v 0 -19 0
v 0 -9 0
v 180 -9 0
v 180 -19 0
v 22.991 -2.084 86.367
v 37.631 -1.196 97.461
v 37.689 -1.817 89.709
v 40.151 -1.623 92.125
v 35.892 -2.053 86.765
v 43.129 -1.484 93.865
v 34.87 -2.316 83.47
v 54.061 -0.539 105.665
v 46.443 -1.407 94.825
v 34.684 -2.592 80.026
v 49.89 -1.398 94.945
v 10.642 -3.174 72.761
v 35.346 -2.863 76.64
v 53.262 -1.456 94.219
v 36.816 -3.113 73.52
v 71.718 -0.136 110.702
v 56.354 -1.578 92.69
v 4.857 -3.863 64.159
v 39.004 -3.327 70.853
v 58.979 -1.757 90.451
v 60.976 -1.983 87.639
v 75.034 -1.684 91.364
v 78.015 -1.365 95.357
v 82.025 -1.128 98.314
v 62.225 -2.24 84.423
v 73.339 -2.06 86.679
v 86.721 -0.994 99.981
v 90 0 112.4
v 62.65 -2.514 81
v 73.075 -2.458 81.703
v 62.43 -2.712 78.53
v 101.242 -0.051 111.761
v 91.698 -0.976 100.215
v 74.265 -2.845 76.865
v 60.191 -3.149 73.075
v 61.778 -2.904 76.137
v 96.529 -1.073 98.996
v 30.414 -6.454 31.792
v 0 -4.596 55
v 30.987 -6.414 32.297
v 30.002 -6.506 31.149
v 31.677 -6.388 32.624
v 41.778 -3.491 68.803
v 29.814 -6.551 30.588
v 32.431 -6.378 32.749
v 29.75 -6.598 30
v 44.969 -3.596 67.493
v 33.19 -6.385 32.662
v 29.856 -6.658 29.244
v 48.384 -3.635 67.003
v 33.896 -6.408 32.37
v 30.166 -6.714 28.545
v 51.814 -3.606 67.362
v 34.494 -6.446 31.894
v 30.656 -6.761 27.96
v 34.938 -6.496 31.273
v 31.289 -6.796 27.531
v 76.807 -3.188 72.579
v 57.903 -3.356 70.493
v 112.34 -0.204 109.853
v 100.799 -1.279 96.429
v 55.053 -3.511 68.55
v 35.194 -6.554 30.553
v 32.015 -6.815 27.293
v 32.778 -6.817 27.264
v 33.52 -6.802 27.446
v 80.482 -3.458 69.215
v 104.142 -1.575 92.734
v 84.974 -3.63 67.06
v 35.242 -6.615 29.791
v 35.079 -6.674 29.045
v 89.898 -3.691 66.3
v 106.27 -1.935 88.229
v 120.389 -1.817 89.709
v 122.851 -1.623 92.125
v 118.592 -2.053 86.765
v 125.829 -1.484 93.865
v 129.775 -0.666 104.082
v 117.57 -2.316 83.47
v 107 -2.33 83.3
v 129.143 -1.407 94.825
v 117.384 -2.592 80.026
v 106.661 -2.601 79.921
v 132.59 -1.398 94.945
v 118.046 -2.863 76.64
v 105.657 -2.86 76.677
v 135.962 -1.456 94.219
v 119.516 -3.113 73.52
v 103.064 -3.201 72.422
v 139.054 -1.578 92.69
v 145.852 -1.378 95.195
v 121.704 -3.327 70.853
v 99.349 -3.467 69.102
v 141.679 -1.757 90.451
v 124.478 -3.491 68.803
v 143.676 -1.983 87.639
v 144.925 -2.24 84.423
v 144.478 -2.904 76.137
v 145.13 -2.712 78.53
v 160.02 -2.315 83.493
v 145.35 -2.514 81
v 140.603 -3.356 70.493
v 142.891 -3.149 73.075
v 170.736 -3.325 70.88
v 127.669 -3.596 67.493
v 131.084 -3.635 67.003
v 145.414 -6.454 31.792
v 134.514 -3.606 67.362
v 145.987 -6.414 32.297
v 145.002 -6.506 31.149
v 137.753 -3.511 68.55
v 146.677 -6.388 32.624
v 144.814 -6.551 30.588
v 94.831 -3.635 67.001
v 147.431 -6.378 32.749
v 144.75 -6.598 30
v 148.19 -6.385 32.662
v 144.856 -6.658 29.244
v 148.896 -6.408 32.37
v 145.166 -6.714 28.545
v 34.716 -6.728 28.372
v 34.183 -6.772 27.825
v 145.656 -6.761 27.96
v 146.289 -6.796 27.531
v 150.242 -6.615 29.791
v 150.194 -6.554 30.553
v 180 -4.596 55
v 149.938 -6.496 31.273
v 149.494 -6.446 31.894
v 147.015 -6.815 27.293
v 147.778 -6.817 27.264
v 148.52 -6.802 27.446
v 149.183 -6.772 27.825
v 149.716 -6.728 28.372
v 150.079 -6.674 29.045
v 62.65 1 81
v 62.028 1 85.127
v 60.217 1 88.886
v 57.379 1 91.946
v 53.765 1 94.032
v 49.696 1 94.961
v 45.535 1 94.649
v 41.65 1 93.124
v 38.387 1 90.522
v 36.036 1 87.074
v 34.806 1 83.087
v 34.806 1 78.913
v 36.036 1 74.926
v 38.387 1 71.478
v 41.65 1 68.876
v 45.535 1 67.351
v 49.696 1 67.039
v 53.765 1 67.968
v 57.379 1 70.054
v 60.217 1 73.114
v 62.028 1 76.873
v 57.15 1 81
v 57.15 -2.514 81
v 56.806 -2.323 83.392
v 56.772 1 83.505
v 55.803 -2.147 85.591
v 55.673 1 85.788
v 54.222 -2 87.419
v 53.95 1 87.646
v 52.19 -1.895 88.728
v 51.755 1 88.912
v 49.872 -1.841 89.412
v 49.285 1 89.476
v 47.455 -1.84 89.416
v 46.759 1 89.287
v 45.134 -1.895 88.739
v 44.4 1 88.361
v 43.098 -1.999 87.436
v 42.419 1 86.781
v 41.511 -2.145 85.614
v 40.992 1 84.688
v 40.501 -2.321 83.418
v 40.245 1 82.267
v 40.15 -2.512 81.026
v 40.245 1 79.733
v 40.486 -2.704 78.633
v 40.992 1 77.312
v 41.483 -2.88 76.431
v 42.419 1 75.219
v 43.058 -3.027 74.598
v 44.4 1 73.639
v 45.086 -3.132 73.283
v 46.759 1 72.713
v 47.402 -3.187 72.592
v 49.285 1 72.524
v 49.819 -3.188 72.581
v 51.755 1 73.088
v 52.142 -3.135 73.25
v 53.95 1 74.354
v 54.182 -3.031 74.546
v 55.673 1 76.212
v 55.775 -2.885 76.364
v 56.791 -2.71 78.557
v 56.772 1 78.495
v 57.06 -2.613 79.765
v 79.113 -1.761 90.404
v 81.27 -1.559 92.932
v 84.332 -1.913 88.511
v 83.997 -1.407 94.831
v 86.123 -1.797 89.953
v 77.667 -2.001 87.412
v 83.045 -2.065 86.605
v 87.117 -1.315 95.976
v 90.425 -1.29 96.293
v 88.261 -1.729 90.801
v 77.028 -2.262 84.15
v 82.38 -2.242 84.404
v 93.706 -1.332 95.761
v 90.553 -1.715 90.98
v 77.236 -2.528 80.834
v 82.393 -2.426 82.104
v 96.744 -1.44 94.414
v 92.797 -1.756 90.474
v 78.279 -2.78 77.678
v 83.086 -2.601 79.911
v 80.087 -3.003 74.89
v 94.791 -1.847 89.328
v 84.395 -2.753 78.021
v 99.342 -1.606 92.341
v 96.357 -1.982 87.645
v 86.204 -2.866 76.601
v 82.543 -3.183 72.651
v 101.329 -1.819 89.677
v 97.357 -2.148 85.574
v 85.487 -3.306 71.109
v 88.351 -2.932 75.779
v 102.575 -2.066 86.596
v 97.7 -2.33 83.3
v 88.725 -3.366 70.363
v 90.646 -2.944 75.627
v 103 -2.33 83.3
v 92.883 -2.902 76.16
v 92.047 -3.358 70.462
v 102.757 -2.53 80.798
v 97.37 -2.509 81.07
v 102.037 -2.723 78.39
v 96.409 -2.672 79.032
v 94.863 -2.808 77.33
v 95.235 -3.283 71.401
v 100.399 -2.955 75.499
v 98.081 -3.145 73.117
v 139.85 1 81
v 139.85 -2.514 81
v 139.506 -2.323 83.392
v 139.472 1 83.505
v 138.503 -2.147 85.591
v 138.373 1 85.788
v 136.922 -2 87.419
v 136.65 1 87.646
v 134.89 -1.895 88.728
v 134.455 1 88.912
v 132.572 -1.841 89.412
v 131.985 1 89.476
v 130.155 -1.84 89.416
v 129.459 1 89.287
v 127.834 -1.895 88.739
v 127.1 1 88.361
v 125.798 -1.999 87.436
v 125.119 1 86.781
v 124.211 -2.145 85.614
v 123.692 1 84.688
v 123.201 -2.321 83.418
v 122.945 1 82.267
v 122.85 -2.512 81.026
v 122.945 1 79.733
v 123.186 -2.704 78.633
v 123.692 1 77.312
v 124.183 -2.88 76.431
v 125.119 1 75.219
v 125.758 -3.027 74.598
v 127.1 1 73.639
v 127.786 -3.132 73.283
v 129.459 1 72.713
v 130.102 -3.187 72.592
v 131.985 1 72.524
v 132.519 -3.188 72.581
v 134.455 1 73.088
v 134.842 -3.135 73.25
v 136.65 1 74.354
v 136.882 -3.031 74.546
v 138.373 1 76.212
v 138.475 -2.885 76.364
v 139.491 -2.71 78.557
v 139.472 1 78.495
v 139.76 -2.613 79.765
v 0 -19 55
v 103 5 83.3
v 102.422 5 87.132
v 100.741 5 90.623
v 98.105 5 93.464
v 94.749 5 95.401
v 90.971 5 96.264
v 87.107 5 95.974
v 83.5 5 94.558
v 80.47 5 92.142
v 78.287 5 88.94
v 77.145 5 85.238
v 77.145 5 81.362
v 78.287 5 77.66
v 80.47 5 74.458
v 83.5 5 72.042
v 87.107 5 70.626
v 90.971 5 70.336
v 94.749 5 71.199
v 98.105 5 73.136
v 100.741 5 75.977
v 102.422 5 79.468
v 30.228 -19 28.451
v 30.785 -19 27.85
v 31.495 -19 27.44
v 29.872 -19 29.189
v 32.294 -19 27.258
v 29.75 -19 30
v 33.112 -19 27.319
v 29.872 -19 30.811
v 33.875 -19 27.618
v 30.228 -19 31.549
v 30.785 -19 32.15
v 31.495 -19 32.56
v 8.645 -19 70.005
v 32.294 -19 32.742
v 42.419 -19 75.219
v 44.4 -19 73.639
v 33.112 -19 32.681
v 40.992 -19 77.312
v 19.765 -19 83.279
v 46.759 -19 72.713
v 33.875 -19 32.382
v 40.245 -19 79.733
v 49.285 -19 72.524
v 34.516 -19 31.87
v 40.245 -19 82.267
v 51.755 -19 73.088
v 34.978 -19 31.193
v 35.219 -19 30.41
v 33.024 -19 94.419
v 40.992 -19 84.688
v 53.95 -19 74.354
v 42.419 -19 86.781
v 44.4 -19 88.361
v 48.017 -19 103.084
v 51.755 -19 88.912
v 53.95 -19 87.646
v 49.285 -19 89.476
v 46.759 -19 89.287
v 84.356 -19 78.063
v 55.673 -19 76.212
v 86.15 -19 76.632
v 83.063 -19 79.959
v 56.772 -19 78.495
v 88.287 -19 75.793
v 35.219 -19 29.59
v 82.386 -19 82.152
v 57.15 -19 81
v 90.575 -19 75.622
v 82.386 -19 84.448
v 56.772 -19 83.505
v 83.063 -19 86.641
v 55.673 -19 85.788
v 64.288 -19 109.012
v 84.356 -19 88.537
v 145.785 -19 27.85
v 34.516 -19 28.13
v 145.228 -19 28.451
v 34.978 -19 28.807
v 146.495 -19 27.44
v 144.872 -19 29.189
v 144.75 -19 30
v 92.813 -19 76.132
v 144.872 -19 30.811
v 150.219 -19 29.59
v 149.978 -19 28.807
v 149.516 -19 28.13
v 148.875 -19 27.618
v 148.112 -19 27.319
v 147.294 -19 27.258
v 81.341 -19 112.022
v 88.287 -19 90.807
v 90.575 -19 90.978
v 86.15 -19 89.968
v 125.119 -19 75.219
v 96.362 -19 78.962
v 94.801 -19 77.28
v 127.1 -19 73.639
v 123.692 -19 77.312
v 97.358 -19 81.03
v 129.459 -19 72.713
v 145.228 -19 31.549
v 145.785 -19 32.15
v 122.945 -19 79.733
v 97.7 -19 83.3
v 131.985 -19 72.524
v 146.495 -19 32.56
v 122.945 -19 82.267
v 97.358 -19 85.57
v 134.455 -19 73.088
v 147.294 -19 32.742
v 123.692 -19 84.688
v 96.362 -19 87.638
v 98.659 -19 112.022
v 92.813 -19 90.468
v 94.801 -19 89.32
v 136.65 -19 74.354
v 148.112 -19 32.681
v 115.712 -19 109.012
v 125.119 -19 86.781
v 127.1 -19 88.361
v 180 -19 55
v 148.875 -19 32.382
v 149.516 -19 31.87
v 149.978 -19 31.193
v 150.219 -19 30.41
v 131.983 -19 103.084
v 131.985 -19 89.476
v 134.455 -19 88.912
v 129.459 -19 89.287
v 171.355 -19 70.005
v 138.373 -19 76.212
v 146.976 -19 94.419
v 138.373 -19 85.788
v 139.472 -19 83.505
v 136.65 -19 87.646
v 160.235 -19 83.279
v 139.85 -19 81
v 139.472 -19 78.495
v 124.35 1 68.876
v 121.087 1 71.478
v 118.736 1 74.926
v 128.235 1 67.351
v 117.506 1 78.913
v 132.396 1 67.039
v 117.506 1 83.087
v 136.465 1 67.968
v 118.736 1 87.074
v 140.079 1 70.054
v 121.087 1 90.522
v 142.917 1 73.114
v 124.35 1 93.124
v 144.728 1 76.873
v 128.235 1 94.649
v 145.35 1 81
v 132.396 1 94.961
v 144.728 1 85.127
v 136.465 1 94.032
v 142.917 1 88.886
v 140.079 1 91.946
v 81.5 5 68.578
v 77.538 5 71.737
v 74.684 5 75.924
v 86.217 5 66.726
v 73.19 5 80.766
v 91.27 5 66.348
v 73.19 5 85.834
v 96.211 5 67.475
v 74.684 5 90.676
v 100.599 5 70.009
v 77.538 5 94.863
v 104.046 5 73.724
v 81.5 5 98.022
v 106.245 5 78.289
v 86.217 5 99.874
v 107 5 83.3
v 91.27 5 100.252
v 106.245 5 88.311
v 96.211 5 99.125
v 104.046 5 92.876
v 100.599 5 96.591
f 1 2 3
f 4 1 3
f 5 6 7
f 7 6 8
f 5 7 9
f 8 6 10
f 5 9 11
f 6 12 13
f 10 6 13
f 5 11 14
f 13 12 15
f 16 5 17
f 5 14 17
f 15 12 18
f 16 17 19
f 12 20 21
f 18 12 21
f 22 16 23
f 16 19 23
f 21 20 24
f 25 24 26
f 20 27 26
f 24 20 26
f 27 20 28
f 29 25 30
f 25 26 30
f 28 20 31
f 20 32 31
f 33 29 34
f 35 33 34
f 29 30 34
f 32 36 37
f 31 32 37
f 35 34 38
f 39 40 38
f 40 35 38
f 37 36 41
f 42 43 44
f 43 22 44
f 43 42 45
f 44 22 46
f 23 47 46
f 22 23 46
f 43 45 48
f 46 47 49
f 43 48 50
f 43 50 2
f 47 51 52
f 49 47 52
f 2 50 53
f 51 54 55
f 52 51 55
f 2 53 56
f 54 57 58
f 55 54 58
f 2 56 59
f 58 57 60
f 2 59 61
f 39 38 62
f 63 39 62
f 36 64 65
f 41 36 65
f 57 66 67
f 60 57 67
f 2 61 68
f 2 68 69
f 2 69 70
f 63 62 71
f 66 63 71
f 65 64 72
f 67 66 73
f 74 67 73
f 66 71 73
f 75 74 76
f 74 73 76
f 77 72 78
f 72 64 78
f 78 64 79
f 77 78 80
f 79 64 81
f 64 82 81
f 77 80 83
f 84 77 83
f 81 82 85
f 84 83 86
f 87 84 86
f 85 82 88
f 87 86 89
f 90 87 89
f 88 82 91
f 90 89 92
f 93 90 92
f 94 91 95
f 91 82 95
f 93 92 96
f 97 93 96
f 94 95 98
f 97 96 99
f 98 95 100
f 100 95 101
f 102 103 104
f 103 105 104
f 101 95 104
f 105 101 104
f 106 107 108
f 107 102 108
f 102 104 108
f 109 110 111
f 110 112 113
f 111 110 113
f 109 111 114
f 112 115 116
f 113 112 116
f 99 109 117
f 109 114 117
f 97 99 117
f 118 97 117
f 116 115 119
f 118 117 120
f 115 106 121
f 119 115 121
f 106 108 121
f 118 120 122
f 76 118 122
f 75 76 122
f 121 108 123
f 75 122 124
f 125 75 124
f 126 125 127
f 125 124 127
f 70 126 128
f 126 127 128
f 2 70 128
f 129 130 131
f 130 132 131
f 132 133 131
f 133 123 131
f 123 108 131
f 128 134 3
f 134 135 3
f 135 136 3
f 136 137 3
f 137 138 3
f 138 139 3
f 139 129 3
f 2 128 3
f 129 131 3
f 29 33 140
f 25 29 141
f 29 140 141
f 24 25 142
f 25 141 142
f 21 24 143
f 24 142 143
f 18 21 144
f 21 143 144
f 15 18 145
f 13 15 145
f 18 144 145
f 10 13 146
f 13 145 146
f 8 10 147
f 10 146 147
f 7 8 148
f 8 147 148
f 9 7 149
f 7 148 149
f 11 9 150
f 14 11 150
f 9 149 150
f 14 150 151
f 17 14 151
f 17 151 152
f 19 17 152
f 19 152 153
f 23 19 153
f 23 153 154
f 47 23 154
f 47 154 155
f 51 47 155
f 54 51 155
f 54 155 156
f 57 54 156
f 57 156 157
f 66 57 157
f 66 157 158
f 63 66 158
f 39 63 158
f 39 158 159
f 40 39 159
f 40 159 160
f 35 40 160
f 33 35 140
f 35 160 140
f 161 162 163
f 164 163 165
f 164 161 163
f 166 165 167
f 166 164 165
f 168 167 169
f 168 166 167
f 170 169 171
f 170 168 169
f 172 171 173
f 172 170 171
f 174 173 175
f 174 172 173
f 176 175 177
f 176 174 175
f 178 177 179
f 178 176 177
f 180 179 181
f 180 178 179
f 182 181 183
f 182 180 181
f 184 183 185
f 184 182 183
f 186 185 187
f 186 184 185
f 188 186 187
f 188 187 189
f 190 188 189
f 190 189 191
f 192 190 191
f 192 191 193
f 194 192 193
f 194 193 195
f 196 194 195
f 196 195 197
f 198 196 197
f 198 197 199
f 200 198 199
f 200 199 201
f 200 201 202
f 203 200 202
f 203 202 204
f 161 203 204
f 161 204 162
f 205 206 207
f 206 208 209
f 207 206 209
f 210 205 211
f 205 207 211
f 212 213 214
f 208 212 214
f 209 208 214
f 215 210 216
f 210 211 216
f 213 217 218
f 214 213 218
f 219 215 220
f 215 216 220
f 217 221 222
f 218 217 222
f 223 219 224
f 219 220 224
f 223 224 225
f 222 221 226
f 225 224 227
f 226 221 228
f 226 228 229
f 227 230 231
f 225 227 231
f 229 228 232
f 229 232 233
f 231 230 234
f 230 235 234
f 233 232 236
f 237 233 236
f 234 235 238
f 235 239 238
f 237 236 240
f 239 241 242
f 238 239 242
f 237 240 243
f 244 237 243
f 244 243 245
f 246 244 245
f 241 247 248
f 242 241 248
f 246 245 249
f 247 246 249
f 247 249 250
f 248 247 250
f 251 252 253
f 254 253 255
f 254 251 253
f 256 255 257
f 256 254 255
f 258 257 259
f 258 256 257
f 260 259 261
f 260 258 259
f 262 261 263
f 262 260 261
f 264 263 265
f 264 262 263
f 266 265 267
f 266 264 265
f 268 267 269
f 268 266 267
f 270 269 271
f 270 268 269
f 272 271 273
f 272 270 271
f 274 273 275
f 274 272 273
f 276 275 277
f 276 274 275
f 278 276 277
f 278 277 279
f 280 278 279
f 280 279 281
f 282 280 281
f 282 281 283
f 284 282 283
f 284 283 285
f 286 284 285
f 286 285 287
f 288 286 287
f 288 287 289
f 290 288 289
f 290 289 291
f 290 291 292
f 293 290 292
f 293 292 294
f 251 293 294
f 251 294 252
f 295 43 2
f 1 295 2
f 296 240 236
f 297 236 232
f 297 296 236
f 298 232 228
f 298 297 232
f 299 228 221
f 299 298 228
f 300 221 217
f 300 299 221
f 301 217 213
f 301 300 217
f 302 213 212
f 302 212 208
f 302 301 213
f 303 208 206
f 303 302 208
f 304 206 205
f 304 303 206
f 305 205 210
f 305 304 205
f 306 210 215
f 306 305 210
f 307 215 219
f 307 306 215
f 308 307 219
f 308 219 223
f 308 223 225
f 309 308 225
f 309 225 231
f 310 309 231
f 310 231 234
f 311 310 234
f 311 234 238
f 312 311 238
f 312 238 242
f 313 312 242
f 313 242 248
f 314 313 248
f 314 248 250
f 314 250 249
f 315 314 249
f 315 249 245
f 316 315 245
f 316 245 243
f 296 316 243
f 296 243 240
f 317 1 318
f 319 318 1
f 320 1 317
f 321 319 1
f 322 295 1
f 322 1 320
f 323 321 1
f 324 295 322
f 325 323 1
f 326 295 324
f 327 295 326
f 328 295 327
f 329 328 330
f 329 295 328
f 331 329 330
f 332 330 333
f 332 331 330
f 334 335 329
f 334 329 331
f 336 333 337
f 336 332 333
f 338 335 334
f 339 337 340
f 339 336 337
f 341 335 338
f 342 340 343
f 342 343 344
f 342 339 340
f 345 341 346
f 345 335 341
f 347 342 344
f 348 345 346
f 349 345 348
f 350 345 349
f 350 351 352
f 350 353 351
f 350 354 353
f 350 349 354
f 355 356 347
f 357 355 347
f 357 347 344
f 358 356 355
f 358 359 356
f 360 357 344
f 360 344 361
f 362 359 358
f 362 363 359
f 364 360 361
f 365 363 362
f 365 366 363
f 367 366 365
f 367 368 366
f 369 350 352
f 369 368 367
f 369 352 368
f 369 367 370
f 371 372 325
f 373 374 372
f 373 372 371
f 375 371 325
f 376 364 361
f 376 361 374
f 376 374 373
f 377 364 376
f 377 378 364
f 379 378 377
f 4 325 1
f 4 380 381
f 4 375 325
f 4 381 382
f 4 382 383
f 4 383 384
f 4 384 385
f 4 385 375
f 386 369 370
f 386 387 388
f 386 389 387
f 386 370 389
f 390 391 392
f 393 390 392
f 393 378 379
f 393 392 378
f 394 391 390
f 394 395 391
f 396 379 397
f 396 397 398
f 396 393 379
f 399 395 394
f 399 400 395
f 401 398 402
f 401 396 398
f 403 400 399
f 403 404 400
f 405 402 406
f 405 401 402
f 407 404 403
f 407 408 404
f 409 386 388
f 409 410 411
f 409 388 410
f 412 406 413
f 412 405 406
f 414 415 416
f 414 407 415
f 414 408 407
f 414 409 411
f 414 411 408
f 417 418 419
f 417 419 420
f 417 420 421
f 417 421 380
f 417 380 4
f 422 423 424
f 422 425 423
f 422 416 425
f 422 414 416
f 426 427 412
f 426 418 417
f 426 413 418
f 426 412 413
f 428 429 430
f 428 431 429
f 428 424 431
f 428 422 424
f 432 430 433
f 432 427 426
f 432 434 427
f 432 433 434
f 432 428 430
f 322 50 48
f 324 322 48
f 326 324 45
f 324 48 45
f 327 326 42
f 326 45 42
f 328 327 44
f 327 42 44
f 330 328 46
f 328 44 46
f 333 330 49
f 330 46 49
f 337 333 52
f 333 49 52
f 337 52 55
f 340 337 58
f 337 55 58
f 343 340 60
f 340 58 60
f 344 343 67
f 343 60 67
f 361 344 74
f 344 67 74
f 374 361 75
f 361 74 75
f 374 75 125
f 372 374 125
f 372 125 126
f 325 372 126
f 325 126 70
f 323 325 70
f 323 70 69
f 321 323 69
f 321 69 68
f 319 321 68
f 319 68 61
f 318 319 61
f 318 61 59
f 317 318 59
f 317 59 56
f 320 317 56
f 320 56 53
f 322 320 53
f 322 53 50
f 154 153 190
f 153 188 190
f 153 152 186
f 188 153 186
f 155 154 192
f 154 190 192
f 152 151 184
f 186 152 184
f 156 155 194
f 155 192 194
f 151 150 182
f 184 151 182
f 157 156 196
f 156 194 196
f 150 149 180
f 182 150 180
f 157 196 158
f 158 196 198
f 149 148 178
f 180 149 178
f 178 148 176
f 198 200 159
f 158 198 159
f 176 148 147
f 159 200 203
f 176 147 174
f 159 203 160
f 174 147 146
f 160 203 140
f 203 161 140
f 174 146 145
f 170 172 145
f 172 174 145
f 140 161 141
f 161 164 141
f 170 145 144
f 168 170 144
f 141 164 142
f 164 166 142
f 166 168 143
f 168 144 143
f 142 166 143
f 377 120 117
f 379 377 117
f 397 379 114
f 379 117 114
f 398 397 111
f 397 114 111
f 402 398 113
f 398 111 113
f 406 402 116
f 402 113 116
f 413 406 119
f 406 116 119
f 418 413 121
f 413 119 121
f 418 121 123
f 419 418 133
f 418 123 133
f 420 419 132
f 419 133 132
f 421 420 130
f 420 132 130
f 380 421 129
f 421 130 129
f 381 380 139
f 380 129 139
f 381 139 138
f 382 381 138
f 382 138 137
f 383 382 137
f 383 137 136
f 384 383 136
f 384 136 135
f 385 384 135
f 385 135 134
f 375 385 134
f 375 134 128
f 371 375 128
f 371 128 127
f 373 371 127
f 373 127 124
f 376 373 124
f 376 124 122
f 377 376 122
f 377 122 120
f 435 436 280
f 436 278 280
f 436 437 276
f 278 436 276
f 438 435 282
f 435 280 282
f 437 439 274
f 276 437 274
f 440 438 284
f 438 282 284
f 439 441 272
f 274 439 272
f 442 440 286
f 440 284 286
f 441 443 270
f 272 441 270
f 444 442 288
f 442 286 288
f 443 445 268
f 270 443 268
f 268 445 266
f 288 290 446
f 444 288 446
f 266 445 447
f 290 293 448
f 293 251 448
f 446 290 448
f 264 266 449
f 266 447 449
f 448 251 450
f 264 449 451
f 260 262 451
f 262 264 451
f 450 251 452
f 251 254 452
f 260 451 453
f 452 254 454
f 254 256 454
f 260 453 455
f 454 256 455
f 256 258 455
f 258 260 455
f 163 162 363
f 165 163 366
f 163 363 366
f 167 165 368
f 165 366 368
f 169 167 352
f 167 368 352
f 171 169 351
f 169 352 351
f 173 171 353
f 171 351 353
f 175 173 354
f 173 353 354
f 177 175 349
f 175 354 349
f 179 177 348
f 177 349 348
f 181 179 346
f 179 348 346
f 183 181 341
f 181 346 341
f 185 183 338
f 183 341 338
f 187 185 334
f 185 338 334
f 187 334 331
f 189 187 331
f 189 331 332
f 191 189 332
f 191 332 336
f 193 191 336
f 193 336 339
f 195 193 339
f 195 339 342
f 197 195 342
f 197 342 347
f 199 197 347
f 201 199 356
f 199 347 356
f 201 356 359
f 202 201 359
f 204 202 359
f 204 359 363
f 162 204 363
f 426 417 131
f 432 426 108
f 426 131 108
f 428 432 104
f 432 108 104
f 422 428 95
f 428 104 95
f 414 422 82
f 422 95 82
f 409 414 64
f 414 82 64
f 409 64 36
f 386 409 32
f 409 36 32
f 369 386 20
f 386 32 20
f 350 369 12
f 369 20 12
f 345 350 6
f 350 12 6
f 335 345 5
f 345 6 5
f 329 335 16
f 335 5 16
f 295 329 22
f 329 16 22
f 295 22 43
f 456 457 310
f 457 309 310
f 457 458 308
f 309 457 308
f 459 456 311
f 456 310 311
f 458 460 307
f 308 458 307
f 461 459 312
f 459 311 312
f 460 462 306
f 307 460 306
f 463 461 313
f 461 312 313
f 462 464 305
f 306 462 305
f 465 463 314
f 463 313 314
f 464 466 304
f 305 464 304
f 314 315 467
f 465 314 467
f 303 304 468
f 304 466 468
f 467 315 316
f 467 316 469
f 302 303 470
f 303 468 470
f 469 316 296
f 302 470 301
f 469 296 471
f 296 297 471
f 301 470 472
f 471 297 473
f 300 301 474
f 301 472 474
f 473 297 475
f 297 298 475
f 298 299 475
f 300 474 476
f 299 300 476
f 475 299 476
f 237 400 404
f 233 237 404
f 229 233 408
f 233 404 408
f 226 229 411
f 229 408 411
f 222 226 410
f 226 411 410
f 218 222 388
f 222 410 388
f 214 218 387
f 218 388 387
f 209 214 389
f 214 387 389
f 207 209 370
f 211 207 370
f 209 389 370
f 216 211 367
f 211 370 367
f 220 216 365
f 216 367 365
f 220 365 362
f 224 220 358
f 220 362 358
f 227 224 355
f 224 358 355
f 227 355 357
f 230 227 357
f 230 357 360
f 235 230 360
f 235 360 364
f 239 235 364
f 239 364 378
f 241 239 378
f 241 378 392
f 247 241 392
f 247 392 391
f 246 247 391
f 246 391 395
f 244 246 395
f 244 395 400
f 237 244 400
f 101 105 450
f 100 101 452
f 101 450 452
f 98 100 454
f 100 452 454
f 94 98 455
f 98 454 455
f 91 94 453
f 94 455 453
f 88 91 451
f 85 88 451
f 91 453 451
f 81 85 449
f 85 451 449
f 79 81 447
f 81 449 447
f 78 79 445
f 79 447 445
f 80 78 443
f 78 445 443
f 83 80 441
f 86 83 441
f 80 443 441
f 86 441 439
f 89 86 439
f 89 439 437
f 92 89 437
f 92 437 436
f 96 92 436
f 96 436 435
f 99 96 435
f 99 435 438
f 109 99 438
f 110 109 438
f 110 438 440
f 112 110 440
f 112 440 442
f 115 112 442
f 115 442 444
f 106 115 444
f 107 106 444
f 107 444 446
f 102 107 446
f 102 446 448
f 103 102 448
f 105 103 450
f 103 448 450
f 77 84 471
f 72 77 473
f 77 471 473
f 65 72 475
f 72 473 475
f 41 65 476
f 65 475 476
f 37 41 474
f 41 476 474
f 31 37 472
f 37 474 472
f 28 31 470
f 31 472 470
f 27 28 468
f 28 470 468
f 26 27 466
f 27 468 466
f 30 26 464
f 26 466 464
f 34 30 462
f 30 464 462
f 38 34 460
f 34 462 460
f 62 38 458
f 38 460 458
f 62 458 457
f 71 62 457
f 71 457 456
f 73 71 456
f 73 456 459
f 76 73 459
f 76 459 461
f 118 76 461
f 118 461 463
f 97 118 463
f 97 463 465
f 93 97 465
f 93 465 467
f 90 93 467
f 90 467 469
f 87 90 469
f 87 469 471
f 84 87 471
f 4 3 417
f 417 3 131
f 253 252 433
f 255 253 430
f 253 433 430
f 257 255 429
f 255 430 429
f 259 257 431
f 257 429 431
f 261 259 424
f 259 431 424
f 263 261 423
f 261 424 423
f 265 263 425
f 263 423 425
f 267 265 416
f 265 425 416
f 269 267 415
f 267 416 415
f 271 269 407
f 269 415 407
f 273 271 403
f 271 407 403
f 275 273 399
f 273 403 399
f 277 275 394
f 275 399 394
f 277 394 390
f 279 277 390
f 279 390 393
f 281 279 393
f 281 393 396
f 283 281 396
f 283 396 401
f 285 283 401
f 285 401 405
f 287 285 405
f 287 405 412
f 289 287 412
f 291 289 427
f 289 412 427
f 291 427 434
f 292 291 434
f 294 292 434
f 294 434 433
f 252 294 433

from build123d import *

# Parameters (mm, degrees)
F1_DEPTH = 19
F3_DEPTH = 180.001
F5_D     = 5.5
F6_R     = 7.7
F6_R_2   = 8.5
F7_DEPTH = 19.001
F9_R     = 17
F9_R_2   = 13
F12_R    = 14
F12_R_2  = 8.5


with BuildPart() as f1:
    # F0 (on Front) → F1 (new body)
    with BuildSketch(Plane.XZ):
        with BuildLine():
            Line((0, 55), (0, 0))
            Line((0, 0), (180, 0))
            Line((180, 0), (180, 55))
            ThreePointArc((180, 55), (90, 112.4), (0, 55))
        make_face()
    extrude(amount=F1_DEPTH)

    # F2 (on face) → F3 (cut, through all)
    with BuildSketch(Plane.YZ.offset(180)):
        Polygon((0, 112.4), (-9, 0), (0, 0), align=None)
    extrude(amount=-F3_DEPTH, mode=Mode.SUBTRACT)

    # F5 (through all)
    with Locations(Plane.XZ.offset(19)):
        with Locations((32.5, 30), (147.5, 30)):
            Hole(F5_D / 2)

    # F6 (on face) → F7 (cut, through all)
    with BuildSketch(Plane.XZ.offset(19)):
        with Locations((90, 83.3)):
            Circle(F6_R)
        with Locations((131.35, 81)):
            Circle(F6_R_2)
        with Locations((48.65, 81)):
            Circle(F6_R_2)
    extrude(amount=-F7_DEPTH, mode=Mode.SUBTRACT)

    # F9 (on offset) → F10 (join, up to the next surface of F1)
    with BuildSketch(Plane.XZ.offset(-5)):
        with Locations((90, 83.3)):
            Circle(F9_R)
        with Locations((90, 83.3)):
            Circle(F9_R_2, mode=Mode.SUBTRACT)
    extrude(until=Until.NEXT)

    # F12 (on offset) → F13 (join, up to the next surface of F1)
    with BuildSketch(Plane.XZ.offset(-1)):
        with Locations((131.35, 81)):
            Circle(F12_R)
        with Locations((131.35, 81)):
            Circle(F12_R_2, mode=Mode.SUBTRACT)
        with Locations((48.65, 81)):
            Circle(F12_R)
        with Locations((48.65, 81)):
            Circle(F12_R_2, mode=Mode.SUBTRACT)
    extrude(until=Until.NEXT)


solid = f1.part
